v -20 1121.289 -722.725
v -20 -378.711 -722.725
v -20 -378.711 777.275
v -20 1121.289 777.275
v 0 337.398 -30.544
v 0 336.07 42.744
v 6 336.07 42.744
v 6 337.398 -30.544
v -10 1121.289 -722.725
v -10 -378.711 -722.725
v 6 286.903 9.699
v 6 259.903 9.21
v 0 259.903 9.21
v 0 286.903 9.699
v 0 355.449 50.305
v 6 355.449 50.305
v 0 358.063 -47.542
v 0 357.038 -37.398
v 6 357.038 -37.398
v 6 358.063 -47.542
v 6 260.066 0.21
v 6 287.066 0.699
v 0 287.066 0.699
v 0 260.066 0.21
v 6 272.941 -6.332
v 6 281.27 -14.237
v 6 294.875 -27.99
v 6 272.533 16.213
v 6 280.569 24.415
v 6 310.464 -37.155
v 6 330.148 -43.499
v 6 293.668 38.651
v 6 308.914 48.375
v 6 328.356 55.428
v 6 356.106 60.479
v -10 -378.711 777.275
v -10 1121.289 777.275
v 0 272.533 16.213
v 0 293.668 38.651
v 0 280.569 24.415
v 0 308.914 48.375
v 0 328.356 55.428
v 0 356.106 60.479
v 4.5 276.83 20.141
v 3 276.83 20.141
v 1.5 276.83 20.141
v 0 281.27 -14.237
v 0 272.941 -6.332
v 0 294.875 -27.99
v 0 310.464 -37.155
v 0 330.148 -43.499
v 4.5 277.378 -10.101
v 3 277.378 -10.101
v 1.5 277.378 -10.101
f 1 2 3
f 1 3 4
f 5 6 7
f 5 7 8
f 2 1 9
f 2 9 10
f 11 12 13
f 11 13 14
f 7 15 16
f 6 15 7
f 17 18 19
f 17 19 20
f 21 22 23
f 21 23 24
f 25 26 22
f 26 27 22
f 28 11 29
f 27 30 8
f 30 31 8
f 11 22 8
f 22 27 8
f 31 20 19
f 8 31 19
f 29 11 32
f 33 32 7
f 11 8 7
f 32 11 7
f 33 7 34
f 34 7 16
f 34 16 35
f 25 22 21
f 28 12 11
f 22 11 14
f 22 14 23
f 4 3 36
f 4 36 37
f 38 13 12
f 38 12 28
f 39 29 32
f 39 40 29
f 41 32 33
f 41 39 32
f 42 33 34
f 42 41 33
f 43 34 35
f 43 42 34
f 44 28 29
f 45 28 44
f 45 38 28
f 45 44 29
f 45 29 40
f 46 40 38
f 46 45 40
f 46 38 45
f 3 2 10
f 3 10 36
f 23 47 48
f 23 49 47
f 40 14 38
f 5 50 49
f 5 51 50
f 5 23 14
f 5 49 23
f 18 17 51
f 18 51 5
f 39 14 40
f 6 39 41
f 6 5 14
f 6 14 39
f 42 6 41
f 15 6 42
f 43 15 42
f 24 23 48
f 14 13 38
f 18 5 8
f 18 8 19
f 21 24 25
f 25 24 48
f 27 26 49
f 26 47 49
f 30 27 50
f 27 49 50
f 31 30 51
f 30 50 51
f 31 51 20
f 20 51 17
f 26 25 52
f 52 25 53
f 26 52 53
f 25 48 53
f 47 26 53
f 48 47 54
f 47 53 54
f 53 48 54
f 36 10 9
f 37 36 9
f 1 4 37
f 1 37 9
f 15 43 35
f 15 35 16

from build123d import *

# Parameters (mm, degrees)
BOSS_EXTRU_2_DEPTH      = 10
BOSS_EXTRU_3_DEPTH      = 6
ENL_V_MAT_EXTRU_1_DEPTH = 6


with BuildPart() as part:
    # Esquisse3D1 → Boss.-Extru.2 (new body)
    with BuildSketch(Plane(origin=(-20, 1121.289346724, 777.274991403), x_dir=(0, -0.7071067811865476, -0.7071067811865476), z_dir=(1, 0, 0))):
        Polygon((0, 0), (1060.66017178, 1060.66017178), (2121.32034356, 0), (1060.66017178, -1060.66017178), align=None)
    extrude(amount=BOSS_EXTRU_2_DEPTH)


with BuildPart() as body_2:
    # Esquisse5 → Boss.-Extru.3 (new body)
    with BuildSketch(Plane(origin=(0, 0, 0), x_dir=(0, 0, -1), z_dir=(1, 0, 0))):
        with BuildLine():
            Line((-42.743657021, 336.070161183), (30.543531084, 337.397786244))
            Line((30.543531084, 337.397786244), (37.397714924, 357.038033491))
            Line((37.397714924, 357.038033491), (47.54183954, 358.062538617))
            add(Edge.make_bspline(
                [(-4.440912922, 245.146035867), (5.270551499, 286.996692264), (14.383631107, 279.496161382), (42.355050039, 288.340732696), (47.54183954, 358.062538617)],
                knots=[0, 0, 0, 0, 0, 1, 1, 1, 1, 1], degree=4))
            add(Edge.make_bspline(
                [(-4.440912922, 245.146035867), (-15.661788901, 286.617495021), (-24.497228506, 278.791819943), (-52.77063524, 286.617495021), (-60.479266526, 356.105695529)],
                knots=[0, 0, 0, 0, 0, 1, 1, 1, 1, 1], degree=4))
            Line((-60.479266526, 356.105695529), (-50.304691241, 355.449271317))
            Line((-50.304691241, 355.449271317), (-42.743657021, 336.070161183))
        make_face()
    extrude(amount=BOSS_EXTRU_3_DEPTH)

    # Esquisse6 → Enlèv. mat.-Extru.1 (cut)
    with BuildSketch(Plane(origin=(6, 0, 0), x_dir=(0, 0, -1), z_dir=(1, 0, 0))):
        Polygon((-9.209725321, 259.903423689), (-9.698840507, 286.903423689), (-0.698840507, 287.066462084), (-0.209725321, 260.066462084), (117.063261114, -47.52702125), (-85.227699586, -65.220017949), align=None)
    extrude(amount=-ENL_V_MAT_EXTRU_1_DEPTH, mode=Mode.SUBTRACT)


solid = Compound([part.part, body_2.part])
